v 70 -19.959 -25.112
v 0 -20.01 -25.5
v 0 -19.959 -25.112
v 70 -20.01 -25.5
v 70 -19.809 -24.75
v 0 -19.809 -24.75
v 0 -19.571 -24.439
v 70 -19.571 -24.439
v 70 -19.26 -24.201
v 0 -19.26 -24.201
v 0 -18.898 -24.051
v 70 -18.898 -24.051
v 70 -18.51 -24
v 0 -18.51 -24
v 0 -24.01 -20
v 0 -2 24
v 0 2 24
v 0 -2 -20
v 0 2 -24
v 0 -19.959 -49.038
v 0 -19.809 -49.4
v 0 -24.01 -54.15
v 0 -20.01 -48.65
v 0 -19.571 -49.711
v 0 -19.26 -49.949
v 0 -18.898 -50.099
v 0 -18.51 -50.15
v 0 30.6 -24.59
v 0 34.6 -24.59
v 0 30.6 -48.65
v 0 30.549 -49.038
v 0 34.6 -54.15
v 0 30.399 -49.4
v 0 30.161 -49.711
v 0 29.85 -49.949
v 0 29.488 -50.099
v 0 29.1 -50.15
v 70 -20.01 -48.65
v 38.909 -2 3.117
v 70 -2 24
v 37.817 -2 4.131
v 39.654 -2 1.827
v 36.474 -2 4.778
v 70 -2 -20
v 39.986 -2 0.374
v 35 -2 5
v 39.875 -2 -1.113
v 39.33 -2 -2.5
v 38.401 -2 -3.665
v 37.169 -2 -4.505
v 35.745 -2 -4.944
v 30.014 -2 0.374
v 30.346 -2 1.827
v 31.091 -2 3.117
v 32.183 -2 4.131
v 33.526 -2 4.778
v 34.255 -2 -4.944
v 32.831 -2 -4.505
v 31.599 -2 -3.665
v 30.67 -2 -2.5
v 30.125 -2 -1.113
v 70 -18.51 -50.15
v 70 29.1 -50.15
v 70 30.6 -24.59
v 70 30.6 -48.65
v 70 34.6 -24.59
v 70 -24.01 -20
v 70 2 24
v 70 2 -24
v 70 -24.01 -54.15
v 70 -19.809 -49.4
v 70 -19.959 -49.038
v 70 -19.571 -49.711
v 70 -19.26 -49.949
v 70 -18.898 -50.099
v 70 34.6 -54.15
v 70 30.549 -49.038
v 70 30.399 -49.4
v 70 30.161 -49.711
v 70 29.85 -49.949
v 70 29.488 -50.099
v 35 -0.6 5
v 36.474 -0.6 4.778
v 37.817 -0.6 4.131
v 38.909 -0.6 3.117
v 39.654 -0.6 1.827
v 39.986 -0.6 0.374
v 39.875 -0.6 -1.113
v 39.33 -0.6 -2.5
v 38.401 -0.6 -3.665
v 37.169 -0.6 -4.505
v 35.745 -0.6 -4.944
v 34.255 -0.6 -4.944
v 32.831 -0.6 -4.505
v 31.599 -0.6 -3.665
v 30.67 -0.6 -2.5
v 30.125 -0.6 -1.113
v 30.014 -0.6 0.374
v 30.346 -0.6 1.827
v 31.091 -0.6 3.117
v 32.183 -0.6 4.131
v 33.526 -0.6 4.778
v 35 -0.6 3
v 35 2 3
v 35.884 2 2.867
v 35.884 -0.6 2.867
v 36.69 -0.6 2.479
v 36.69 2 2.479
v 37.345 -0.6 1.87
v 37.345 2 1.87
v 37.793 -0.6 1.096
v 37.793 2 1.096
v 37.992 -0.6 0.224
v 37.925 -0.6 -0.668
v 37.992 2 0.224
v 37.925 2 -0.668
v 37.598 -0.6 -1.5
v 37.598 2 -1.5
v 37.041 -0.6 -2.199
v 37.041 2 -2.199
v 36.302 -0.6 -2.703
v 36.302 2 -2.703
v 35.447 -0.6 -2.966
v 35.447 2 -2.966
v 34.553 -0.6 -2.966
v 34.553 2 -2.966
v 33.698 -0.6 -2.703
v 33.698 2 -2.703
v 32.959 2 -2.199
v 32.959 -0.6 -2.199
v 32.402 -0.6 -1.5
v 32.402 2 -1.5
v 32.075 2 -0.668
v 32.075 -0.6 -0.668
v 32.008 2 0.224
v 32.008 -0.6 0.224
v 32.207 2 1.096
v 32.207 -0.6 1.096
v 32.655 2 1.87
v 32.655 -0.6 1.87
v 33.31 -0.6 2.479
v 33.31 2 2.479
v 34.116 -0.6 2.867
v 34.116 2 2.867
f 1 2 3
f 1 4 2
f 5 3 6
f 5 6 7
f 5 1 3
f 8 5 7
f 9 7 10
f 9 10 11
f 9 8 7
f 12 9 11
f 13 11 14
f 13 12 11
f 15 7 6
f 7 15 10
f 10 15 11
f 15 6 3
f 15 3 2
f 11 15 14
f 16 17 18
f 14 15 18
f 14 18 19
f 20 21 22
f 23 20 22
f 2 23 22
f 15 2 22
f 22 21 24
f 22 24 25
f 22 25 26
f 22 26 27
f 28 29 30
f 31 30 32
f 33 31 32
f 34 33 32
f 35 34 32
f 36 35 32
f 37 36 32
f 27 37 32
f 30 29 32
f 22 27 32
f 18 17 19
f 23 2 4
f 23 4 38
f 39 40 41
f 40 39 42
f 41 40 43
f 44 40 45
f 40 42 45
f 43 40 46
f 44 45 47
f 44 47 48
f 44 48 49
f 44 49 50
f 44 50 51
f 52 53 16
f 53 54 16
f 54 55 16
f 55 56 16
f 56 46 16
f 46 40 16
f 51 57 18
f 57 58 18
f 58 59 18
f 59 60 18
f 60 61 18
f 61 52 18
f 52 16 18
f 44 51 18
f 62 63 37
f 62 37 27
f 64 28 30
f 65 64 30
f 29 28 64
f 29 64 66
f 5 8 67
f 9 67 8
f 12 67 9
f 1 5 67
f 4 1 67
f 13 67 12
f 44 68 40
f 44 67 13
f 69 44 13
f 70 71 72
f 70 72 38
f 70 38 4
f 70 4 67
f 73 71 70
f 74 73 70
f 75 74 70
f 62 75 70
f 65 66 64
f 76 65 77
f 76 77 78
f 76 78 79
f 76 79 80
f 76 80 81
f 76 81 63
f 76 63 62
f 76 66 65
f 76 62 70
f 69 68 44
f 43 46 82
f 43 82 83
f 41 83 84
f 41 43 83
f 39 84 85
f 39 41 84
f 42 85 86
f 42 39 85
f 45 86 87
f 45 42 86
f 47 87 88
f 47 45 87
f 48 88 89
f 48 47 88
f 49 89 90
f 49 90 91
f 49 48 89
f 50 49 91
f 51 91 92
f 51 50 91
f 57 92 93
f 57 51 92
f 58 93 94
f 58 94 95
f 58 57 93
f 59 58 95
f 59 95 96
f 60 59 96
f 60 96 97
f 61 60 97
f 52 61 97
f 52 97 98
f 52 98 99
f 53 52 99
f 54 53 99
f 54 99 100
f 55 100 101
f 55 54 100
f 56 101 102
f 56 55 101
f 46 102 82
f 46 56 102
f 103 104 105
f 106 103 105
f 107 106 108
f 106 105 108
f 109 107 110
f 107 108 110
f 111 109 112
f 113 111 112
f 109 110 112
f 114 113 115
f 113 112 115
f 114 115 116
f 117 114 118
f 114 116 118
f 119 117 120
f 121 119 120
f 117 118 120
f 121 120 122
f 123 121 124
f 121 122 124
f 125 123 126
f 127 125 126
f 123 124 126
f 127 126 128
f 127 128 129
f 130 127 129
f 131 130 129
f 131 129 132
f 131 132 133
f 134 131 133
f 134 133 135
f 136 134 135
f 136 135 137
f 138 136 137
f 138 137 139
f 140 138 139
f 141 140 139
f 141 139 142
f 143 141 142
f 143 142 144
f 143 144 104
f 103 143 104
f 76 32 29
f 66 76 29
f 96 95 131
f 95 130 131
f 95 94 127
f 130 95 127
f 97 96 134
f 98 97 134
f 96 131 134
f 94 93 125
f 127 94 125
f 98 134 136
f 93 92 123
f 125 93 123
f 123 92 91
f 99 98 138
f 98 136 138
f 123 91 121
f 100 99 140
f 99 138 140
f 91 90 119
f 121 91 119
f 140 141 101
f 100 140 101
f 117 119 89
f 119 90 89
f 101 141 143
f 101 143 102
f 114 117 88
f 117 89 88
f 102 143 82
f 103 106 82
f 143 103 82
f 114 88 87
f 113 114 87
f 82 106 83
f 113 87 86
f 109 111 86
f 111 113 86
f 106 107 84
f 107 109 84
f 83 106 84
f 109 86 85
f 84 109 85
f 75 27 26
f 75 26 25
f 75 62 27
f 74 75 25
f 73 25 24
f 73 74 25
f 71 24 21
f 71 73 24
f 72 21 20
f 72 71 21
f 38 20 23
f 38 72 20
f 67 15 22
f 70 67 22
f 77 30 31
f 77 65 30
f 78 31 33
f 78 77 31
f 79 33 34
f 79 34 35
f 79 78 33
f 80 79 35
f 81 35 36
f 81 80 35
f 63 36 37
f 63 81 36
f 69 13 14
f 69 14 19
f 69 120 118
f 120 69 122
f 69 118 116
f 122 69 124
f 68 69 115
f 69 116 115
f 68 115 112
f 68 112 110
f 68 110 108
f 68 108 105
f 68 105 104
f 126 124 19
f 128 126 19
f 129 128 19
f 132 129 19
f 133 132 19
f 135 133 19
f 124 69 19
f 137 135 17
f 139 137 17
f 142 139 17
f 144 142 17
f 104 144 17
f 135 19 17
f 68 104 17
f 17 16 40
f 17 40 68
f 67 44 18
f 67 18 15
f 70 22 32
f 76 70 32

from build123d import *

# Parameters (mm, degrees)
SKETCH2_W           = 44
SKETCH2_H           = 4
SKETCH2_W_2         = 4
SKETCH2_W_3         = 26.15
SKETCH2_W_4         = 25.56
BOSS_EXTRUDE1_DEPTH = 70
FILLET1_R           = 1.5
SKETCH3_R           = 3
CUT_EXTRUDE1_DEPTH  = 95.313214875
SKETCH4_R           = 5
CUT_EXTRUDE2_DEPTH  = 1.4


with BuildPart() as part:
    # Sketch2 → Boss-Extrude1 (new body)
    with BuildSketch(Plane(origin=(0, 0, 0), x_dir=(0, 0, -1), z_dir=(1, 0, 0))):
        with Locations((-2, 0)):
            Rectangle(SKETCH2_W, SKETCH2_H)
        with Locations((22, 0)):
            Rectangle(SKETCH2_W_2, SKETCH2_H)
        Polygon((24, -2), (20, -2), (20, -24.01), (24, -24.01), (24, -20.01), align=None)
        with Locations((37.075, -22.01)):
            Rectangle(SKETCH2_W_3, SKETCH2_H)
        Polygon((50.15, 30.6), (50.15, -20.01), (50.15, -24.01), (54.15, -24.01), (54.15, 34.6), (50.15, 34.6), align=None)
        with Locations((37.37, 32.6)):
            Rectangle(SKETCH2_W_4, SKETCH2_H)
    extrude(amount=BOSS_EXTRUDE1_DEPTH)

    # Fillet1
    fillet1_edges = [part.edges().sort_by_distance(p)[0] for p in [
        (35, -20.01, -24),
        (35, -20.01, -50.15),
        (35, 30.6, -50.15),
    ]]
    fillet(fillet1_edges, radius=FILLET1_R)

    # Sketch3 → Cut-Extrude1 (cut, through all)
    with BuildSketch(Plane(origin=(0, 2, 0), x_dir=(1, 0, 0), z_dir=(0, 1, 0))):
        with Locations(Location((35, 0, 0), (0, 0, 270))):
            Circle(SKETCH3_R)
    extrude(amount=-CUT_EXTRUDE1_DEPTH, mode=Mode.SUBTRACT)

    # Sketch4 → Cut-Extrude2 (cut)
    with BuildSketch(Plane(origin=(0, -2, 0), x_dir=(1, 0, 0), z_dir=(0, 1, 0))):
        with Locations(Location((35, 0, 0), (0, 0, 270))):
            Circle(SKETCH4_R)
    extrude(amount=CUT_EXTRUDE2_DEPTH, mode=Mode.SUBTRACT)


solid = part.part
